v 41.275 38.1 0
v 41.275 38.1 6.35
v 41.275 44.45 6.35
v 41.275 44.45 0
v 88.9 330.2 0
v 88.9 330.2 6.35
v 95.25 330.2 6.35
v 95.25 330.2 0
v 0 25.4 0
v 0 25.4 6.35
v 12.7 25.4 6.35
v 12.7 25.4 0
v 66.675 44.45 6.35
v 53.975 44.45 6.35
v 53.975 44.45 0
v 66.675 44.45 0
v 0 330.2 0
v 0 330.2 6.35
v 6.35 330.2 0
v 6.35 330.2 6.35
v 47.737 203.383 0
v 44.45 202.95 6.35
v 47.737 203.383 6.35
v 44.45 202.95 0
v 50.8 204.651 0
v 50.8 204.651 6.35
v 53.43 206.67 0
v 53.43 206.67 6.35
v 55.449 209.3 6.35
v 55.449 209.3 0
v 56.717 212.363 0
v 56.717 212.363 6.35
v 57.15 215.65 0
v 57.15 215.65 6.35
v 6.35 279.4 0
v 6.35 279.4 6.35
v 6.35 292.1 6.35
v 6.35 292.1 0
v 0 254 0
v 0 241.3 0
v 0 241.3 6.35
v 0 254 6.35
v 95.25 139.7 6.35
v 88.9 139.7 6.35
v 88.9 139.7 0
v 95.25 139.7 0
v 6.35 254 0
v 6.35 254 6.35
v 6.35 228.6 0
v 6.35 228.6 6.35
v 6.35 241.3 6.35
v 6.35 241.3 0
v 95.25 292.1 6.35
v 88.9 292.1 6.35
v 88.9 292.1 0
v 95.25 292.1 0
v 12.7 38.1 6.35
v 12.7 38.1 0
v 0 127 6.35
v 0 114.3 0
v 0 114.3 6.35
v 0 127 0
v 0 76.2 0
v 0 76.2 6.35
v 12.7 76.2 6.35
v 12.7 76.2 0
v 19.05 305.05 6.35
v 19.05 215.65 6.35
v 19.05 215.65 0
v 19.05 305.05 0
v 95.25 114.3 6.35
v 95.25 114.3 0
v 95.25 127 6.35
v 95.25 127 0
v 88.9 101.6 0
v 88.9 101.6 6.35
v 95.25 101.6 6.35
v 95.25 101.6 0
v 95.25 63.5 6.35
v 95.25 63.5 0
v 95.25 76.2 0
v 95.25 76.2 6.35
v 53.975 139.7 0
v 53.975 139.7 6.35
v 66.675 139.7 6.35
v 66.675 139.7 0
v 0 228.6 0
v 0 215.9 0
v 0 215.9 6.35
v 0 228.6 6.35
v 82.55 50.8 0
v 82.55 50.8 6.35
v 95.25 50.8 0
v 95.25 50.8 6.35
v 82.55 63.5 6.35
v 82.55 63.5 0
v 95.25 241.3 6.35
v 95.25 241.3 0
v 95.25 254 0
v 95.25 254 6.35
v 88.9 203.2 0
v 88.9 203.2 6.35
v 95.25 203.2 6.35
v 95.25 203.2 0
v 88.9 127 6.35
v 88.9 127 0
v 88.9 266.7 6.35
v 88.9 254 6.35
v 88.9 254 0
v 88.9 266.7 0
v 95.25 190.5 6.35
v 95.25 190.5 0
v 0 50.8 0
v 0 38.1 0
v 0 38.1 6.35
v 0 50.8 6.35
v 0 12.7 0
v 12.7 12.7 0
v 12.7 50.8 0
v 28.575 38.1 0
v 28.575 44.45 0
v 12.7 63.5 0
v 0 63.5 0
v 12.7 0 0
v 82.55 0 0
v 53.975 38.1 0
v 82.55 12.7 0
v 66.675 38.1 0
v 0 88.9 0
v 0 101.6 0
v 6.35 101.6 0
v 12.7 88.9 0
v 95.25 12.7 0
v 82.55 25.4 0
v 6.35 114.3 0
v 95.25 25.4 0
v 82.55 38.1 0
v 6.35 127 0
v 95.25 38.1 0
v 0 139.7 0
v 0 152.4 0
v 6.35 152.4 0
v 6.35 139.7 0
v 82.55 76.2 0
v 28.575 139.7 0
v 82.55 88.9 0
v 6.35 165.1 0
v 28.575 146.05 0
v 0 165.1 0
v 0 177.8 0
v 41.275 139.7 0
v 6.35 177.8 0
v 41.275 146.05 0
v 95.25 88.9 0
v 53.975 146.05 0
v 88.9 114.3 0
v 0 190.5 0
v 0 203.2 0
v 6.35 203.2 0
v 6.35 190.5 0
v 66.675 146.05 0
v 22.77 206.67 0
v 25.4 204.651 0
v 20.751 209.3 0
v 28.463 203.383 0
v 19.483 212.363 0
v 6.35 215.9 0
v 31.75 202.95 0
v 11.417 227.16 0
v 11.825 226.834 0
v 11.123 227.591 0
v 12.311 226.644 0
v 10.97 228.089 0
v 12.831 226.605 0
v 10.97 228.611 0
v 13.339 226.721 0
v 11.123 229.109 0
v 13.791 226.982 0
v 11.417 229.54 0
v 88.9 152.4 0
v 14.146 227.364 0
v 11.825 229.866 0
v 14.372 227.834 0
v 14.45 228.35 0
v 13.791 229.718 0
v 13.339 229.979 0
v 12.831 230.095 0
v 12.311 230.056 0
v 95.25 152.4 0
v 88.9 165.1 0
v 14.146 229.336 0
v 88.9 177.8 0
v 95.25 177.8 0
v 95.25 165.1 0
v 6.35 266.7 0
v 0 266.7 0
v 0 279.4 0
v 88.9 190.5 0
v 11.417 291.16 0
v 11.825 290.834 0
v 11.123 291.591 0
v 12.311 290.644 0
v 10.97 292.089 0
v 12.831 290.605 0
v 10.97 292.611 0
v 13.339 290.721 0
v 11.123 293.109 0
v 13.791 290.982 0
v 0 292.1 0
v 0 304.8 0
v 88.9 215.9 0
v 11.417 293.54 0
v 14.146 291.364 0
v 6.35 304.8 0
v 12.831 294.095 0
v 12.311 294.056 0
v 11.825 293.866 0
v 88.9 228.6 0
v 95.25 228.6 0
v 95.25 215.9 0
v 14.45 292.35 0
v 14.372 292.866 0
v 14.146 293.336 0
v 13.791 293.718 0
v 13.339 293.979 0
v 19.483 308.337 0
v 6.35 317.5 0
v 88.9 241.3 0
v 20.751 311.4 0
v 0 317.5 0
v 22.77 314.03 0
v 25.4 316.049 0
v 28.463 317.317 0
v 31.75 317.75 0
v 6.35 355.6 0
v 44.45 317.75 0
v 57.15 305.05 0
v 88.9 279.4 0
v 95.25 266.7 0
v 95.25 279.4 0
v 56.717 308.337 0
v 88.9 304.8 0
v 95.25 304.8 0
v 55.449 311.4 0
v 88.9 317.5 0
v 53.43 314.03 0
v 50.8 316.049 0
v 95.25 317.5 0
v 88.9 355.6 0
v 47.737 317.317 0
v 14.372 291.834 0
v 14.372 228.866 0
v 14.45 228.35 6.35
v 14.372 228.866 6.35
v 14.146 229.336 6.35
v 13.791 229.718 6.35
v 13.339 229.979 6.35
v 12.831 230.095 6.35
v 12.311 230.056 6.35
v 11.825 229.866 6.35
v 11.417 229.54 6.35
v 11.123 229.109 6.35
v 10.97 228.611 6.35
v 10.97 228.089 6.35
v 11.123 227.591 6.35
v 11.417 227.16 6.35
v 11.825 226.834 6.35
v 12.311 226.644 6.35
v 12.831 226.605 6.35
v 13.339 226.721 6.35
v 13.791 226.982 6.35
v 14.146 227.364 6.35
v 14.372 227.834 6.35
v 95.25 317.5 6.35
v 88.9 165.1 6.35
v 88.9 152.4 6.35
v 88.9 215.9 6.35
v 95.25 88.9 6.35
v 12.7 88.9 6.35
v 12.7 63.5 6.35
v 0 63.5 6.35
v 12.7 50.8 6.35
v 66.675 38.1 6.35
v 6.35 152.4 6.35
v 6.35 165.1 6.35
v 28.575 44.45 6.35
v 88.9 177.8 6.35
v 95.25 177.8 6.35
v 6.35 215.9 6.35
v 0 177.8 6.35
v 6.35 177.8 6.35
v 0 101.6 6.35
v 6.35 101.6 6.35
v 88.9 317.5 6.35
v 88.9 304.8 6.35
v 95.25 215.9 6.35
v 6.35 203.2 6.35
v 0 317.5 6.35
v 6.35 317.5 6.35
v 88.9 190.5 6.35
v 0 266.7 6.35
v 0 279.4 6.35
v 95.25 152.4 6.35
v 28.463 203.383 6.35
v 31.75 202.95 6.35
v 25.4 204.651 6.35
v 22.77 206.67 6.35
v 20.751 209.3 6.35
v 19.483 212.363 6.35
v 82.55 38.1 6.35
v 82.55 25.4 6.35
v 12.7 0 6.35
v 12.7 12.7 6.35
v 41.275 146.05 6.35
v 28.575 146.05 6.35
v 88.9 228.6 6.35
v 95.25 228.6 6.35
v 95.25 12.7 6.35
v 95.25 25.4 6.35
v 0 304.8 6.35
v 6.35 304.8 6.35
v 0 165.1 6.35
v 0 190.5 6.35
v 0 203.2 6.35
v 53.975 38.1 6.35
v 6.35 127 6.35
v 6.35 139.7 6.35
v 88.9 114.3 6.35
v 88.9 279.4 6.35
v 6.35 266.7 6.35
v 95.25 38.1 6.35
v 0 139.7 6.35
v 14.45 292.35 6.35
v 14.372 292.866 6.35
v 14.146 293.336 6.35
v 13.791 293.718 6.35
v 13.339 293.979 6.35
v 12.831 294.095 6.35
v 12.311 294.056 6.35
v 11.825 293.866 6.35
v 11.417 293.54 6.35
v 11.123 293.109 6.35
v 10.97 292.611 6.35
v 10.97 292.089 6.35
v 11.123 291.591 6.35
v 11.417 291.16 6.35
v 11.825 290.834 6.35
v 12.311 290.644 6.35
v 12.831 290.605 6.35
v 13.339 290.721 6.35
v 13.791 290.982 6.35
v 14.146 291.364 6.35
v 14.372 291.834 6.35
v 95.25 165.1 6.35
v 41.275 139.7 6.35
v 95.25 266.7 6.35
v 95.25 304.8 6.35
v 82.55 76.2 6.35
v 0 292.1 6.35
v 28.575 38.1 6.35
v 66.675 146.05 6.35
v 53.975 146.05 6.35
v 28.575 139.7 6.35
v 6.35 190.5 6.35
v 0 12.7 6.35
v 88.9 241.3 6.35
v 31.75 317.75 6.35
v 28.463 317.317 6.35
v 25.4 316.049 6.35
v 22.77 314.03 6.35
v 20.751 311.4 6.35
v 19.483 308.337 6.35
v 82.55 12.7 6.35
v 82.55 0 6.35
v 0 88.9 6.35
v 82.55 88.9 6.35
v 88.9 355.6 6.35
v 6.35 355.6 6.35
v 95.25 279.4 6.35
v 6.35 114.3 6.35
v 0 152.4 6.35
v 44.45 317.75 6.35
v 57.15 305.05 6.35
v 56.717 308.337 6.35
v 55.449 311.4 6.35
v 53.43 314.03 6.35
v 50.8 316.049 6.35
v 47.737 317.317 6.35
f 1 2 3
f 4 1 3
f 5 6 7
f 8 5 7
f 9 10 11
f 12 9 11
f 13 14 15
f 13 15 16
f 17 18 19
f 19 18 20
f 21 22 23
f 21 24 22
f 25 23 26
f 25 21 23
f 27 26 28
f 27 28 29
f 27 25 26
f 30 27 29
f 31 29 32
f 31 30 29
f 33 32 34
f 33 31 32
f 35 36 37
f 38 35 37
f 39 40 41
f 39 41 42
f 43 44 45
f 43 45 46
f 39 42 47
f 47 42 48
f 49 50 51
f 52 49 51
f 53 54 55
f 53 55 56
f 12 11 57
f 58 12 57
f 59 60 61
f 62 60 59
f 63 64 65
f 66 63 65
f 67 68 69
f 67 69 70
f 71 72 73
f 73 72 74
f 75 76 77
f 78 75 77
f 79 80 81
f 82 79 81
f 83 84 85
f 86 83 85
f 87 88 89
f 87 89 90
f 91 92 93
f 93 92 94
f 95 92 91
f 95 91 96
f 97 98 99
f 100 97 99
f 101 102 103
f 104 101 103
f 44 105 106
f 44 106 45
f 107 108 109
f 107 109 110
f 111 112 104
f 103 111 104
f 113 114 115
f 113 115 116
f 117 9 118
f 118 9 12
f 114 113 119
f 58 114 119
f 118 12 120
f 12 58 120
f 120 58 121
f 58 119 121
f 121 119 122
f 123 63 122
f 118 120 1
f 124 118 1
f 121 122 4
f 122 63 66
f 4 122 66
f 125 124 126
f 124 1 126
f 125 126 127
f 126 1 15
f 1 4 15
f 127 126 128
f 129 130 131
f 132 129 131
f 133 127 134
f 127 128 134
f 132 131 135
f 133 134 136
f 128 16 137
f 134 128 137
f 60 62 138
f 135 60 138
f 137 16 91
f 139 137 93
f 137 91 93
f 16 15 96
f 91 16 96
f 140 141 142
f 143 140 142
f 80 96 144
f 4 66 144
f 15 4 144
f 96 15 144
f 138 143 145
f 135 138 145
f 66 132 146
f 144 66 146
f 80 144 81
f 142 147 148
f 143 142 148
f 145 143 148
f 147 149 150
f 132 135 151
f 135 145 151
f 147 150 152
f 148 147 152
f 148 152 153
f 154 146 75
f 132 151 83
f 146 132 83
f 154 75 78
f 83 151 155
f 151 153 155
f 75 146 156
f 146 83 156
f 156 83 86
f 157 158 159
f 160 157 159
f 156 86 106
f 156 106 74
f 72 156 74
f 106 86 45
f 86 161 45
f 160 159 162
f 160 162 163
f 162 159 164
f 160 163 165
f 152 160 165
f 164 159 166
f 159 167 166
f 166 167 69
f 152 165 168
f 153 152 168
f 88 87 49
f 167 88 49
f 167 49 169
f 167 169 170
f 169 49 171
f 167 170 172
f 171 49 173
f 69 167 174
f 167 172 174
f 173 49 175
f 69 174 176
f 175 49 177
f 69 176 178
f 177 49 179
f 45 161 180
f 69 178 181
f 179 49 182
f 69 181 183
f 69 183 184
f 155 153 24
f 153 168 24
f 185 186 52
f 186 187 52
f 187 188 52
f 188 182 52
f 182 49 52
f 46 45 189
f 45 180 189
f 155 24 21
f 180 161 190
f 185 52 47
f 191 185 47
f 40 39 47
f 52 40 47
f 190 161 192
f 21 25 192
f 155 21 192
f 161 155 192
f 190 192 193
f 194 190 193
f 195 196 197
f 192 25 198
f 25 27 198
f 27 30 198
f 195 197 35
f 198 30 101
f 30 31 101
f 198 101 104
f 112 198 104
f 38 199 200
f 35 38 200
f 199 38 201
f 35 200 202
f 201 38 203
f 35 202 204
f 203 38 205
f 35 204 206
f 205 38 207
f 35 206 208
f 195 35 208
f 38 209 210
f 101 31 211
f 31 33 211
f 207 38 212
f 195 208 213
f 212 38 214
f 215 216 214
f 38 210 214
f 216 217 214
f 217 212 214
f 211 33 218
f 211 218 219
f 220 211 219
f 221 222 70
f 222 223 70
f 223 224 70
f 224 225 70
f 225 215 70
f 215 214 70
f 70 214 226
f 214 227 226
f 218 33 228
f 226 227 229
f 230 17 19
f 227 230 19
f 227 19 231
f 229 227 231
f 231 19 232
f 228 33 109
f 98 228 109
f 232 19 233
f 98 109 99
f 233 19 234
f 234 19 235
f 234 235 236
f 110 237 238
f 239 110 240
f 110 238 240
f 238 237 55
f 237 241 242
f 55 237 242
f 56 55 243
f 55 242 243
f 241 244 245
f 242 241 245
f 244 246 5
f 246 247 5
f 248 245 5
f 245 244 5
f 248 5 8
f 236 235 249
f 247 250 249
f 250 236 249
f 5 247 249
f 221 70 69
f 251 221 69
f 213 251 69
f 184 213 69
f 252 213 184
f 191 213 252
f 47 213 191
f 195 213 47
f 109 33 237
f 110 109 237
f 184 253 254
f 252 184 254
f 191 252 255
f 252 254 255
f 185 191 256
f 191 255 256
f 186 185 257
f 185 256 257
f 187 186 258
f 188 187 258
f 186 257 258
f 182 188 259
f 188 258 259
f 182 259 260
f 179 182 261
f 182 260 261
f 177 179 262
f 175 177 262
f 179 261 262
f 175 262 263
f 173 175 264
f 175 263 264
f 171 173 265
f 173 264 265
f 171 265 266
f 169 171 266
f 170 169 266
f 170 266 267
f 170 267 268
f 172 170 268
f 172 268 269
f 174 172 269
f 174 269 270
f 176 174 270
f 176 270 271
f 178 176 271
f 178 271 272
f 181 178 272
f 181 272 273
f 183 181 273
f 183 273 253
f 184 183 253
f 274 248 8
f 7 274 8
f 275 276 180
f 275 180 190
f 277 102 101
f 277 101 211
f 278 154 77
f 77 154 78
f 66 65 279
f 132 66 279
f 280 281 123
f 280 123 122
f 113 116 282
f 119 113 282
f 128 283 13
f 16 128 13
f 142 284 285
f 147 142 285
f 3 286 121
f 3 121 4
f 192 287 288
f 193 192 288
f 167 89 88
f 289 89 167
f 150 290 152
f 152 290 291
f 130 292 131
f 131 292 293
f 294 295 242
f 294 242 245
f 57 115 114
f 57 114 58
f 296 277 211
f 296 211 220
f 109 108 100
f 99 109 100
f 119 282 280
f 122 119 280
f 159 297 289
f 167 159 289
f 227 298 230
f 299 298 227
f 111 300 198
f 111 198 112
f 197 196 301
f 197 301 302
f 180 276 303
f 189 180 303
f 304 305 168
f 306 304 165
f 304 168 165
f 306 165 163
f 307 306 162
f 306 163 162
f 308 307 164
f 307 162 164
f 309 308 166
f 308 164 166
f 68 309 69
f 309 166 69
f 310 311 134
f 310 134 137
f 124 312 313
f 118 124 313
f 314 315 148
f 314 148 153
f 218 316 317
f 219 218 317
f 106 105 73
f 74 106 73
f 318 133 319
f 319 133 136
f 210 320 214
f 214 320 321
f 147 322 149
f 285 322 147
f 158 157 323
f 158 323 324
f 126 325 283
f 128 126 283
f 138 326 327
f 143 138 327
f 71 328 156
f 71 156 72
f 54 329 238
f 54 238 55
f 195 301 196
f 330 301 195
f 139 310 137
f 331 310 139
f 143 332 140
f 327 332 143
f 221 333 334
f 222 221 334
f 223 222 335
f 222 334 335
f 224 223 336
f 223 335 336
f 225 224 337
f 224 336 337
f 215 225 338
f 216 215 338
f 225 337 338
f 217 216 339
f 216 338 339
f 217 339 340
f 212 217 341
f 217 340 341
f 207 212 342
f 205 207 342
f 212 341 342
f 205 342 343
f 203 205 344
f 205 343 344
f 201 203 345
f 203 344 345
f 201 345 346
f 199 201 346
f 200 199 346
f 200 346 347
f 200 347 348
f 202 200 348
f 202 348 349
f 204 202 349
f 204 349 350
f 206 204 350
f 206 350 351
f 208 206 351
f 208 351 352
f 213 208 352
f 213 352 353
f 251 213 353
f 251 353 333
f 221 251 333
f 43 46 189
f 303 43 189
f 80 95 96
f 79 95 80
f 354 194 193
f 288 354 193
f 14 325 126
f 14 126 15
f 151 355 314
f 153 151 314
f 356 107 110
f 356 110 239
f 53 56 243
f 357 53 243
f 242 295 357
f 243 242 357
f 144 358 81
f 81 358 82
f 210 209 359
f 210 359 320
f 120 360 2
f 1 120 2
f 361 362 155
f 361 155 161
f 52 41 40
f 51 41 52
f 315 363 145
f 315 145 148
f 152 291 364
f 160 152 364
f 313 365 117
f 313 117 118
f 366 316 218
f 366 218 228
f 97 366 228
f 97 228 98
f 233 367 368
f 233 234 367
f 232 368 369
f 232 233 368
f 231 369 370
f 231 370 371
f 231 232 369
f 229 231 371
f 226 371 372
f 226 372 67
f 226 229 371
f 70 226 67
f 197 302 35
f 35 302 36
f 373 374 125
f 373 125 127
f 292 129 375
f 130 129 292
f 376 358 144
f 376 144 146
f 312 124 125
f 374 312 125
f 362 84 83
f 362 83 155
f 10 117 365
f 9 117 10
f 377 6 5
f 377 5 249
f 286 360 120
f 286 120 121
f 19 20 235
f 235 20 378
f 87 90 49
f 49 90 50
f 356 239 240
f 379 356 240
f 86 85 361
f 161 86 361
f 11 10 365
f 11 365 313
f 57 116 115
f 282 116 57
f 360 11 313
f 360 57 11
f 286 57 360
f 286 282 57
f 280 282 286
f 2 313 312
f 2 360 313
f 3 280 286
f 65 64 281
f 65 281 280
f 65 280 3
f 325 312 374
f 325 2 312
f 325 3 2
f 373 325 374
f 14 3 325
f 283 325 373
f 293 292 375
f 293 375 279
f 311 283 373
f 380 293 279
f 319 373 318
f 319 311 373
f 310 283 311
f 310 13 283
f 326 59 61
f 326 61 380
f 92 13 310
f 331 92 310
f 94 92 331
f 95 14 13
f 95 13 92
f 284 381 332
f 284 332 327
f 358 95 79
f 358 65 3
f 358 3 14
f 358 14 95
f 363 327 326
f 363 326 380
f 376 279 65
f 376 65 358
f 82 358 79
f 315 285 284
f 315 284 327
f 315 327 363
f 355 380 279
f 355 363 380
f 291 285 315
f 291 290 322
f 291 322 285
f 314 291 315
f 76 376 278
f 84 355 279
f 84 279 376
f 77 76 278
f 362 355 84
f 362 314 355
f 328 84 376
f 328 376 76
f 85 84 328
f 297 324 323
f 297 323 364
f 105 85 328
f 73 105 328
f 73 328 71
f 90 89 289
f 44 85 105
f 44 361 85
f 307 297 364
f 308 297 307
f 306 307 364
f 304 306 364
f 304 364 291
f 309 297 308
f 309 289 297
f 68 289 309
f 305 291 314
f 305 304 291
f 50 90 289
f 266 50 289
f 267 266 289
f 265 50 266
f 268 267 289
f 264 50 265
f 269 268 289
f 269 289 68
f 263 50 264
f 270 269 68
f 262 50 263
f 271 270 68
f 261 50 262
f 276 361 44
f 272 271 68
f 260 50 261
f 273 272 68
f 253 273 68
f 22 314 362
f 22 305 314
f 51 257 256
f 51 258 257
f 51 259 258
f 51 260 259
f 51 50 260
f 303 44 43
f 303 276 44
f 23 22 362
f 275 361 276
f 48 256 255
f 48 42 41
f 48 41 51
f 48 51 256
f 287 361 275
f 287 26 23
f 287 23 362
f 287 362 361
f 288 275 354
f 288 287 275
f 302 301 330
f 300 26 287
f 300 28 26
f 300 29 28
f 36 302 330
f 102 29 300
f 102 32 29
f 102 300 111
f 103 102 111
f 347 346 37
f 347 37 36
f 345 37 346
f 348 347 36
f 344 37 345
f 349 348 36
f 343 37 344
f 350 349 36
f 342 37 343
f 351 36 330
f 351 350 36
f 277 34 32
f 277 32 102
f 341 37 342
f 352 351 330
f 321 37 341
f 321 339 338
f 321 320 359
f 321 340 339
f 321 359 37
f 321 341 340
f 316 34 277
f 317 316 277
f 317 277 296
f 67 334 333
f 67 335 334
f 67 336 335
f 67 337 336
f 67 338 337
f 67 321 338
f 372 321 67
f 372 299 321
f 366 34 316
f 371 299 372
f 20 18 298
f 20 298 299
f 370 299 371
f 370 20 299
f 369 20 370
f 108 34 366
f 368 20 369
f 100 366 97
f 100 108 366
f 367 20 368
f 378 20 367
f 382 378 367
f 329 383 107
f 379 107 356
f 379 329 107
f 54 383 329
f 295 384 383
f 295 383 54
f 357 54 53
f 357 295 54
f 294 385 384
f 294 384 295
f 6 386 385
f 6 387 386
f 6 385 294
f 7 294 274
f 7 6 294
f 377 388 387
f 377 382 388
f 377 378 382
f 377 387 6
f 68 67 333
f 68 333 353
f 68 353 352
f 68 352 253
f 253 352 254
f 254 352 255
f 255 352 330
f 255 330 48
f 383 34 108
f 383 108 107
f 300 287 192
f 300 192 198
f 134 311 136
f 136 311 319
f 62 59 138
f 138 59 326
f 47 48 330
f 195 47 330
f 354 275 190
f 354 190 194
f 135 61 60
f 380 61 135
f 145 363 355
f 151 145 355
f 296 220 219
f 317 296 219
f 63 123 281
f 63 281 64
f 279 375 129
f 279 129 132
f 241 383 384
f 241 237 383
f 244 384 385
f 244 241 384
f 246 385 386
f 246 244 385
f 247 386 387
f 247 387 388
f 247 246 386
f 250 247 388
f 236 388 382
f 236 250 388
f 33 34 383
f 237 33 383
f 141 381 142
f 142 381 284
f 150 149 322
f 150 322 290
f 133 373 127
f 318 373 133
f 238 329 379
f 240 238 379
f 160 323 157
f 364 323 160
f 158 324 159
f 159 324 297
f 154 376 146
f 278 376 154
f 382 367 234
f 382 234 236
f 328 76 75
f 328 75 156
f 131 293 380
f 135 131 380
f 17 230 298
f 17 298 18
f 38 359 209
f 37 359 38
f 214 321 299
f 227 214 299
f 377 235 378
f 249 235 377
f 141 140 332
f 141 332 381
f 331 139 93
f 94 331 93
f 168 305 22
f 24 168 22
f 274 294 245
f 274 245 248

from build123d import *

# Parameters (mm, degrees)
SKETCH1_W           = 95.25
SKETCH1_H           = 355.6
BOSS_EXTRUDE1_DEPTH = 6.35
SKETCH2_W           = 12.7
SKETCH2_H           = 12.7
CUT_EXTRUDE1_DEPTH  = 7.35
LPATTERN1_COUNT     = 16
LPATTERN1_PITCH     = 25.4
SKETCH3_W           = 12.7
SKETCH3_H           = 6.35
CUT_EXTRUDE2_DEPTH  = 7.35
LPATTERN4_COUNT     = 2
LPATTERN4_PITCH     = 76.2
SKETCH5_W           = 6.35
SKETCH5_H           = 254
BOSS_EXTRUDE2_DEPTH = 6.35
SKETCH6_W           = 6.35
SKETCH6_H           = 12.7
CUT_EXTRUDE3_DEPTH  = 7.35
SKETCH7_W           = 38.1
SKETCH7_H           = 6.35
BOSS_EXTRUDE4_DEPTH = 6.35
SKETCH8_W           = 12.7
SKETCH8_H           = 6.35
CUT_EXTRUDE4_DEPTH  = 7.35
SKETCH9_R           = 1.75
CUT_EXTRUDE5_DEPTH  = 7.35
SKETCH10_W          = 38.1
SKETCH10_H          = 114.8
CUT_EXTRUDE6_DEPTH  = 7.35
FILLET1_R           = 12.7


with BuildPart() as part:
    # Sketch1 → Boss-Extrude1 (new body)
    with BuildSketch(Plane.XY):
        with Locations((47.625, 177.8)):
            Rectangle(SKETCH1_W, SKETCH1_H)
    extrude(amount=BOSS_EXTRUDE1_DEPTH)

    # Sketch2 → Cut-Extrude1 (cut, through all)
    with BuildSketch(Plane.XY.offset(6.35)):
        with Locations((6.35, 6.35)):
            Rectangle(SKETCH2_W, SKETCH2_H)
        with Locations((88.9, 6.35)):
            Rectangle(SKETCH2_W, SKETCH2_H)
    cut_extrude1 = extrude(amount=-CUT_EXTRUDE1_DEPTH, mode=Mode.SUBTRACT)

    # LPattern1: Cut-Extrude1 ×16
    with Locations(*[(0, i * LPATTERN1_PITCH, 0) for i in range(1, LPATTERN1_COUNT)]):
        add(cut_extrude1, mode=Mode.SUBTRACT)

    # Sketch3 → Cut-Extrude2 (cut, through all)
    with BuildSketch(Plane.XY.offset(6.35)):
        with Locations((34.925, 41.275)):
            Rectangle(SKETCH3_W, SKETCH3_H)
        with Locations((60.325, 41.275)):
            Rectangle(SKETCH3_W, SKETCH3_H)
    cut_extrude2 = extrude(amount=-CUT_EXTRUDE2_DEPTH, mode=Mode.SUBTRACT)

    # LPattern4: Cut-Extrude2 ×2
    with Locations(*[(0, i * LPATTERN4_PITCH, 0) for i in range(1, LPATTERN4_COUNT)]):
        add(cut_extrude2, mode=Mode.SUBTRACT)

    # Sketch5 → Boss-Extrude2 (add, through all)
    with BuildSketch(Plane.XY.offset(6.35)):
        with Locations((9.525, 228.6)):
            Rectangle(SKETCH5_W, SKETCH5_H)
        with Locations((85.725, 228.6)):
            Rectangle(SKETCH5_W, SKETCH5_H)
    extrude(amount=-BOSS_EXTRUDE2_DEPTH)

    # Sketch6 → Cut-Extrude3 (cut, through all)
    with BuildSketch(Plane.XY.offset(6.35)):
        with Locations((3.175, 349.25)):
            Rectangle(SKETCH6_W, SKETCH6_H)
        with Locations((92.075, 349.25)):
            Rectangle(SKETCH6_W, SKETCH6_H)
    extrude(amount=-CUT_EXTRUDE3_DEPTH, mode=Mode.SUBTRACT)

    # Sketch7 → Boss-Extrude4 (add, through all)
    with BuildSketch(Plane.XY.offset(6.35)):
        with Locations((47.625, 117.475)):
            Rectangle(SKETCH7_W, SKETCH7_H)
    extrude(amount=-BOSS_EXTRUDE4_DEPTH)

    # Sketch8 → Cut-Extrude4 (cut, through all)
    with BuildSketch(Plane.XY.offset(6.35)):
        with Locations((34.925, 142.875)):
            Rectangle(SKETCH8_W, SKETCH8_H)
        with Locations((60.325, 142.875)):
            Rectangle(SKETCH8_W, SKETCH8_H)
    extrude(amount=-CUT_EXTRUDE4_DEPTH, mode=Mode.SUBTRACT)

    # Sketch9 → Cut-Extrude5 (cut, through all)
    with BuildSketch(Plane.XY.offset(6.35)):
        with Locations((12.7, 292.35)):
            Circle(SKETCH9_R)
        with Locations((12.7, 228.35)):
            Circle(SKETCH9_R)
    extrude(amount=-CUT_EXTRUDE5_DEPTH, mode=Mode.SUBTRACT)

    # Sketch10 → Cut-Extrude6 (cut, through all)
    with BuildSketch(Plane.XY.offset(6.35)):
        with Locations((38.1, 260.35)):
            Rectangle(SKETCH10_W, SKETCH10_H)
    extrude(amount=-CUT_EXTRUDE6_DEPTH, mode=Mode.SUBTRACT)

    # Fillet1
    fillet1_edges = [part.edges().sort_by_distance(p)[0] for p in [
        (19.05, 202.95, 3.175),
        (19.05, 317.75, 3.175),
        (57.15, 317.75, 3.175),
        (57.15, 202.95, 3.175),
    ]]
    fillet(fillet1_edges, radius=FILLET1_R)


solid = part.part
